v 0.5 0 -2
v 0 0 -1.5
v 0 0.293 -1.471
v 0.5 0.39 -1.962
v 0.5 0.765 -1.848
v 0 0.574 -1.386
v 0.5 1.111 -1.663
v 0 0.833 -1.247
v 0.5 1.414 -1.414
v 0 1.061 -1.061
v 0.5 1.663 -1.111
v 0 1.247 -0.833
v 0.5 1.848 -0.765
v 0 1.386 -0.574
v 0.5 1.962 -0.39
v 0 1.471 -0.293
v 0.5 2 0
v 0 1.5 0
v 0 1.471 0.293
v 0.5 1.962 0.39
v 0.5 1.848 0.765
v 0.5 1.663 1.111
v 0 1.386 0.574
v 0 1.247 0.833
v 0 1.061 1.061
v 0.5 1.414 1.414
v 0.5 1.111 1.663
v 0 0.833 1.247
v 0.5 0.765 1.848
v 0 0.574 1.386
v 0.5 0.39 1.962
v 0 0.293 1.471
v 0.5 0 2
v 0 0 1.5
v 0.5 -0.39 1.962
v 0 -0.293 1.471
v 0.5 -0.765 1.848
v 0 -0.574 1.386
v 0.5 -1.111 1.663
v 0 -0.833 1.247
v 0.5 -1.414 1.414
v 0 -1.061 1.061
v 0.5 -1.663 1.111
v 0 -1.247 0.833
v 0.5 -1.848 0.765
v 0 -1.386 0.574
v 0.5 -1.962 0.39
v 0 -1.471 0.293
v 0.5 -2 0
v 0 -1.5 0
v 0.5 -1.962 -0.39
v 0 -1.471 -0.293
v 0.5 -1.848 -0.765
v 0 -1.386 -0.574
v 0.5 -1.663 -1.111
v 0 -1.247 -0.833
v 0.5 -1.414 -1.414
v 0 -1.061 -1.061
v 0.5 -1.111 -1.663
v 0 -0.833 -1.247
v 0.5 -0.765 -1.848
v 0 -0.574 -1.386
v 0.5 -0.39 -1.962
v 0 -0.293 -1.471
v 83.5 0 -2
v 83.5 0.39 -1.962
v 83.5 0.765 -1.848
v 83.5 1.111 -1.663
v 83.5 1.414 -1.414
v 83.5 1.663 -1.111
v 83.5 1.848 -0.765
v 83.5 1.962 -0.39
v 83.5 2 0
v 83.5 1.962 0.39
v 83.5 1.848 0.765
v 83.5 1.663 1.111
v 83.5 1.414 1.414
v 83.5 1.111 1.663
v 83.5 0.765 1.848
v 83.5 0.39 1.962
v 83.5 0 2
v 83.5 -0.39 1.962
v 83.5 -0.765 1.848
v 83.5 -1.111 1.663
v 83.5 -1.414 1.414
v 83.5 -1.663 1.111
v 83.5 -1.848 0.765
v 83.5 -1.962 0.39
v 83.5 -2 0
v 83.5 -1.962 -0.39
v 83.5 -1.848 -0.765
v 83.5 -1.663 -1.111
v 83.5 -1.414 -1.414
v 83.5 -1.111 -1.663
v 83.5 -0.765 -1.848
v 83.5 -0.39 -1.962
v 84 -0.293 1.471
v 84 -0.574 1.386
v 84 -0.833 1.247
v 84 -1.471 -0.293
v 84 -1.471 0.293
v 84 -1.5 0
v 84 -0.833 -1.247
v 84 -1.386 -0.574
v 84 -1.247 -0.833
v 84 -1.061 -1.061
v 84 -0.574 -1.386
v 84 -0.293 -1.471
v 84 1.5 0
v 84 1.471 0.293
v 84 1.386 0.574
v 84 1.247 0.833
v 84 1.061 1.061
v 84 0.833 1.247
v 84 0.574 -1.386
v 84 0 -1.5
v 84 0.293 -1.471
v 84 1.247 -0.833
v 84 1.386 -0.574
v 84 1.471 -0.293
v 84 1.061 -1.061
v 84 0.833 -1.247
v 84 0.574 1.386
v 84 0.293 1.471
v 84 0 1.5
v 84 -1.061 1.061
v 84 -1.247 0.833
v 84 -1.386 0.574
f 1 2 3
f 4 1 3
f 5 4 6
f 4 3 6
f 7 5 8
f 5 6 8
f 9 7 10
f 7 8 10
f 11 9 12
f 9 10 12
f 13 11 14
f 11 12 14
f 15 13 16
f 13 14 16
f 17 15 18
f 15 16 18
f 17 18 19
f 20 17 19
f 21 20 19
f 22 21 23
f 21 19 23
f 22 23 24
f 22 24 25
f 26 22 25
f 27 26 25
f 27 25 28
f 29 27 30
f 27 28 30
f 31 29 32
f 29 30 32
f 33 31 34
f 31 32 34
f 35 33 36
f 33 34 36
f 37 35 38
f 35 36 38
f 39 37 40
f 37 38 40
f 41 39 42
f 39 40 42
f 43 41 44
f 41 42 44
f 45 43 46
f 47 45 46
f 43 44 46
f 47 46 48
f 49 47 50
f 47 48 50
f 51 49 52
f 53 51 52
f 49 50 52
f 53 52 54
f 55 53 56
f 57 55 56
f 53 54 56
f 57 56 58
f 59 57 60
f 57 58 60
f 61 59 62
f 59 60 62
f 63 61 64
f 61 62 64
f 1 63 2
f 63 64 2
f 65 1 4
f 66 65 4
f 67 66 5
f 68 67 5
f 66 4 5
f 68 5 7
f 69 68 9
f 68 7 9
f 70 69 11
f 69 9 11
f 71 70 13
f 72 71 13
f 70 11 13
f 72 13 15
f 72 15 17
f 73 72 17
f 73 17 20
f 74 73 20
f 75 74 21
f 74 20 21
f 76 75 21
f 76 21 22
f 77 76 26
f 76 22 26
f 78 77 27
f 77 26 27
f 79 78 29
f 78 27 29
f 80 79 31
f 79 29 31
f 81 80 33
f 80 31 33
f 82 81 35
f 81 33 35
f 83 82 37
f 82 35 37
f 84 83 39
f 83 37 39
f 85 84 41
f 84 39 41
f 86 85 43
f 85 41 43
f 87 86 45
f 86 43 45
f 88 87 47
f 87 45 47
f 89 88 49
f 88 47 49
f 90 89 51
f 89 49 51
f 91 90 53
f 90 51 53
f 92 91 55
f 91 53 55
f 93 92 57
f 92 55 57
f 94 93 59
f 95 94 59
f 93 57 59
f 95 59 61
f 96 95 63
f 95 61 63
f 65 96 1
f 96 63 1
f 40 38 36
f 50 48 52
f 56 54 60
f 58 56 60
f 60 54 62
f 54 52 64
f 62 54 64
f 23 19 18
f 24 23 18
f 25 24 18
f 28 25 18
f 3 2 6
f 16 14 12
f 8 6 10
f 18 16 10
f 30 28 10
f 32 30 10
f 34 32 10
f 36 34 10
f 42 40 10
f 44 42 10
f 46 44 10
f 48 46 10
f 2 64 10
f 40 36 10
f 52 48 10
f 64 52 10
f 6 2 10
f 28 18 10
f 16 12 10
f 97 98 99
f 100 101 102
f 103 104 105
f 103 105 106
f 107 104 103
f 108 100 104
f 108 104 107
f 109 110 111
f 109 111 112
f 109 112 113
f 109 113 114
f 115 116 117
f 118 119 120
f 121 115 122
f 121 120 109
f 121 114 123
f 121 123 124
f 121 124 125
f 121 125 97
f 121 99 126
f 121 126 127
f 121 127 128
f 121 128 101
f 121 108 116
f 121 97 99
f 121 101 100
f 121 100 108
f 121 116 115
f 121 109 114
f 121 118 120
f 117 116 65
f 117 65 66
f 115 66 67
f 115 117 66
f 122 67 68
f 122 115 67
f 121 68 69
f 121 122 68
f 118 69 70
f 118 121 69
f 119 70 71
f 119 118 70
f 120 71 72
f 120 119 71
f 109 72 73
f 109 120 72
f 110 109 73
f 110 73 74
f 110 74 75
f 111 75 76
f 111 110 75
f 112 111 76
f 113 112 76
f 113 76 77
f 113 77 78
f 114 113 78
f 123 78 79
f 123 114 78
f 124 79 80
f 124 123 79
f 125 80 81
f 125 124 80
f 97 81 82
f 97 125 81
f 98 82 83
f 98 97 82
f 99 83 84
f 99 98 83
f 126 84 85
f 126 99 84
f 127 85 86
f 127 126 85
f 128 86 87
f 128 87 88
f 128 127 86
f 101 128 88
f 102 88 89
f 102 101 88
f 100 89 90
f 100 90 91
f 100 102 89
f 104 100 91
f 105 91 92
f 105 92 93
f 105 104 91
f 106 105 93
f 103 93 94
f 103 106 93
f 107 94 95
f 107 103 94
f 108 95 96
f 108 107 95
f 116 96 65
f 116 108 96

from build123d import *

# Parameters (mm, degrees)
SKETCH1_R           = 2
BOSS_EXTRUDE1_DEPTH = 84
CHAMFER1_SIZE       = 0.5
CHAMFER2_SIZE       = 0.5


with BuildPart() as part:
    # Sketch1 → Boss-Extrude1 (new body)
    with BuildSketch(Plane(origin=(0, 0, 0), x_dir=(0, 0, -1), z_dir=(1, 0, 0))):
        Circle(SKETCH1_R)
    extrude(amount=BOSS_EXTRUDE1_DEPTH)

    # Chamfer1
    chamfer1_edges = [part.edges().sort_by_distance(p)[0] for p in [
        (0, 0, 2),
    ]]
    chamfer(chamfer1_edges, length=CHAMFER1_SIZE)

    # Chamfer2
    chamfer2_edges = [part.edges().sort_by_distance(p)[0] for p in [
        (84, 0, 2),
    ]]
    chamfer(chamfer2_edges, length=CHAMFER2_SIZE)


solid = part.part
